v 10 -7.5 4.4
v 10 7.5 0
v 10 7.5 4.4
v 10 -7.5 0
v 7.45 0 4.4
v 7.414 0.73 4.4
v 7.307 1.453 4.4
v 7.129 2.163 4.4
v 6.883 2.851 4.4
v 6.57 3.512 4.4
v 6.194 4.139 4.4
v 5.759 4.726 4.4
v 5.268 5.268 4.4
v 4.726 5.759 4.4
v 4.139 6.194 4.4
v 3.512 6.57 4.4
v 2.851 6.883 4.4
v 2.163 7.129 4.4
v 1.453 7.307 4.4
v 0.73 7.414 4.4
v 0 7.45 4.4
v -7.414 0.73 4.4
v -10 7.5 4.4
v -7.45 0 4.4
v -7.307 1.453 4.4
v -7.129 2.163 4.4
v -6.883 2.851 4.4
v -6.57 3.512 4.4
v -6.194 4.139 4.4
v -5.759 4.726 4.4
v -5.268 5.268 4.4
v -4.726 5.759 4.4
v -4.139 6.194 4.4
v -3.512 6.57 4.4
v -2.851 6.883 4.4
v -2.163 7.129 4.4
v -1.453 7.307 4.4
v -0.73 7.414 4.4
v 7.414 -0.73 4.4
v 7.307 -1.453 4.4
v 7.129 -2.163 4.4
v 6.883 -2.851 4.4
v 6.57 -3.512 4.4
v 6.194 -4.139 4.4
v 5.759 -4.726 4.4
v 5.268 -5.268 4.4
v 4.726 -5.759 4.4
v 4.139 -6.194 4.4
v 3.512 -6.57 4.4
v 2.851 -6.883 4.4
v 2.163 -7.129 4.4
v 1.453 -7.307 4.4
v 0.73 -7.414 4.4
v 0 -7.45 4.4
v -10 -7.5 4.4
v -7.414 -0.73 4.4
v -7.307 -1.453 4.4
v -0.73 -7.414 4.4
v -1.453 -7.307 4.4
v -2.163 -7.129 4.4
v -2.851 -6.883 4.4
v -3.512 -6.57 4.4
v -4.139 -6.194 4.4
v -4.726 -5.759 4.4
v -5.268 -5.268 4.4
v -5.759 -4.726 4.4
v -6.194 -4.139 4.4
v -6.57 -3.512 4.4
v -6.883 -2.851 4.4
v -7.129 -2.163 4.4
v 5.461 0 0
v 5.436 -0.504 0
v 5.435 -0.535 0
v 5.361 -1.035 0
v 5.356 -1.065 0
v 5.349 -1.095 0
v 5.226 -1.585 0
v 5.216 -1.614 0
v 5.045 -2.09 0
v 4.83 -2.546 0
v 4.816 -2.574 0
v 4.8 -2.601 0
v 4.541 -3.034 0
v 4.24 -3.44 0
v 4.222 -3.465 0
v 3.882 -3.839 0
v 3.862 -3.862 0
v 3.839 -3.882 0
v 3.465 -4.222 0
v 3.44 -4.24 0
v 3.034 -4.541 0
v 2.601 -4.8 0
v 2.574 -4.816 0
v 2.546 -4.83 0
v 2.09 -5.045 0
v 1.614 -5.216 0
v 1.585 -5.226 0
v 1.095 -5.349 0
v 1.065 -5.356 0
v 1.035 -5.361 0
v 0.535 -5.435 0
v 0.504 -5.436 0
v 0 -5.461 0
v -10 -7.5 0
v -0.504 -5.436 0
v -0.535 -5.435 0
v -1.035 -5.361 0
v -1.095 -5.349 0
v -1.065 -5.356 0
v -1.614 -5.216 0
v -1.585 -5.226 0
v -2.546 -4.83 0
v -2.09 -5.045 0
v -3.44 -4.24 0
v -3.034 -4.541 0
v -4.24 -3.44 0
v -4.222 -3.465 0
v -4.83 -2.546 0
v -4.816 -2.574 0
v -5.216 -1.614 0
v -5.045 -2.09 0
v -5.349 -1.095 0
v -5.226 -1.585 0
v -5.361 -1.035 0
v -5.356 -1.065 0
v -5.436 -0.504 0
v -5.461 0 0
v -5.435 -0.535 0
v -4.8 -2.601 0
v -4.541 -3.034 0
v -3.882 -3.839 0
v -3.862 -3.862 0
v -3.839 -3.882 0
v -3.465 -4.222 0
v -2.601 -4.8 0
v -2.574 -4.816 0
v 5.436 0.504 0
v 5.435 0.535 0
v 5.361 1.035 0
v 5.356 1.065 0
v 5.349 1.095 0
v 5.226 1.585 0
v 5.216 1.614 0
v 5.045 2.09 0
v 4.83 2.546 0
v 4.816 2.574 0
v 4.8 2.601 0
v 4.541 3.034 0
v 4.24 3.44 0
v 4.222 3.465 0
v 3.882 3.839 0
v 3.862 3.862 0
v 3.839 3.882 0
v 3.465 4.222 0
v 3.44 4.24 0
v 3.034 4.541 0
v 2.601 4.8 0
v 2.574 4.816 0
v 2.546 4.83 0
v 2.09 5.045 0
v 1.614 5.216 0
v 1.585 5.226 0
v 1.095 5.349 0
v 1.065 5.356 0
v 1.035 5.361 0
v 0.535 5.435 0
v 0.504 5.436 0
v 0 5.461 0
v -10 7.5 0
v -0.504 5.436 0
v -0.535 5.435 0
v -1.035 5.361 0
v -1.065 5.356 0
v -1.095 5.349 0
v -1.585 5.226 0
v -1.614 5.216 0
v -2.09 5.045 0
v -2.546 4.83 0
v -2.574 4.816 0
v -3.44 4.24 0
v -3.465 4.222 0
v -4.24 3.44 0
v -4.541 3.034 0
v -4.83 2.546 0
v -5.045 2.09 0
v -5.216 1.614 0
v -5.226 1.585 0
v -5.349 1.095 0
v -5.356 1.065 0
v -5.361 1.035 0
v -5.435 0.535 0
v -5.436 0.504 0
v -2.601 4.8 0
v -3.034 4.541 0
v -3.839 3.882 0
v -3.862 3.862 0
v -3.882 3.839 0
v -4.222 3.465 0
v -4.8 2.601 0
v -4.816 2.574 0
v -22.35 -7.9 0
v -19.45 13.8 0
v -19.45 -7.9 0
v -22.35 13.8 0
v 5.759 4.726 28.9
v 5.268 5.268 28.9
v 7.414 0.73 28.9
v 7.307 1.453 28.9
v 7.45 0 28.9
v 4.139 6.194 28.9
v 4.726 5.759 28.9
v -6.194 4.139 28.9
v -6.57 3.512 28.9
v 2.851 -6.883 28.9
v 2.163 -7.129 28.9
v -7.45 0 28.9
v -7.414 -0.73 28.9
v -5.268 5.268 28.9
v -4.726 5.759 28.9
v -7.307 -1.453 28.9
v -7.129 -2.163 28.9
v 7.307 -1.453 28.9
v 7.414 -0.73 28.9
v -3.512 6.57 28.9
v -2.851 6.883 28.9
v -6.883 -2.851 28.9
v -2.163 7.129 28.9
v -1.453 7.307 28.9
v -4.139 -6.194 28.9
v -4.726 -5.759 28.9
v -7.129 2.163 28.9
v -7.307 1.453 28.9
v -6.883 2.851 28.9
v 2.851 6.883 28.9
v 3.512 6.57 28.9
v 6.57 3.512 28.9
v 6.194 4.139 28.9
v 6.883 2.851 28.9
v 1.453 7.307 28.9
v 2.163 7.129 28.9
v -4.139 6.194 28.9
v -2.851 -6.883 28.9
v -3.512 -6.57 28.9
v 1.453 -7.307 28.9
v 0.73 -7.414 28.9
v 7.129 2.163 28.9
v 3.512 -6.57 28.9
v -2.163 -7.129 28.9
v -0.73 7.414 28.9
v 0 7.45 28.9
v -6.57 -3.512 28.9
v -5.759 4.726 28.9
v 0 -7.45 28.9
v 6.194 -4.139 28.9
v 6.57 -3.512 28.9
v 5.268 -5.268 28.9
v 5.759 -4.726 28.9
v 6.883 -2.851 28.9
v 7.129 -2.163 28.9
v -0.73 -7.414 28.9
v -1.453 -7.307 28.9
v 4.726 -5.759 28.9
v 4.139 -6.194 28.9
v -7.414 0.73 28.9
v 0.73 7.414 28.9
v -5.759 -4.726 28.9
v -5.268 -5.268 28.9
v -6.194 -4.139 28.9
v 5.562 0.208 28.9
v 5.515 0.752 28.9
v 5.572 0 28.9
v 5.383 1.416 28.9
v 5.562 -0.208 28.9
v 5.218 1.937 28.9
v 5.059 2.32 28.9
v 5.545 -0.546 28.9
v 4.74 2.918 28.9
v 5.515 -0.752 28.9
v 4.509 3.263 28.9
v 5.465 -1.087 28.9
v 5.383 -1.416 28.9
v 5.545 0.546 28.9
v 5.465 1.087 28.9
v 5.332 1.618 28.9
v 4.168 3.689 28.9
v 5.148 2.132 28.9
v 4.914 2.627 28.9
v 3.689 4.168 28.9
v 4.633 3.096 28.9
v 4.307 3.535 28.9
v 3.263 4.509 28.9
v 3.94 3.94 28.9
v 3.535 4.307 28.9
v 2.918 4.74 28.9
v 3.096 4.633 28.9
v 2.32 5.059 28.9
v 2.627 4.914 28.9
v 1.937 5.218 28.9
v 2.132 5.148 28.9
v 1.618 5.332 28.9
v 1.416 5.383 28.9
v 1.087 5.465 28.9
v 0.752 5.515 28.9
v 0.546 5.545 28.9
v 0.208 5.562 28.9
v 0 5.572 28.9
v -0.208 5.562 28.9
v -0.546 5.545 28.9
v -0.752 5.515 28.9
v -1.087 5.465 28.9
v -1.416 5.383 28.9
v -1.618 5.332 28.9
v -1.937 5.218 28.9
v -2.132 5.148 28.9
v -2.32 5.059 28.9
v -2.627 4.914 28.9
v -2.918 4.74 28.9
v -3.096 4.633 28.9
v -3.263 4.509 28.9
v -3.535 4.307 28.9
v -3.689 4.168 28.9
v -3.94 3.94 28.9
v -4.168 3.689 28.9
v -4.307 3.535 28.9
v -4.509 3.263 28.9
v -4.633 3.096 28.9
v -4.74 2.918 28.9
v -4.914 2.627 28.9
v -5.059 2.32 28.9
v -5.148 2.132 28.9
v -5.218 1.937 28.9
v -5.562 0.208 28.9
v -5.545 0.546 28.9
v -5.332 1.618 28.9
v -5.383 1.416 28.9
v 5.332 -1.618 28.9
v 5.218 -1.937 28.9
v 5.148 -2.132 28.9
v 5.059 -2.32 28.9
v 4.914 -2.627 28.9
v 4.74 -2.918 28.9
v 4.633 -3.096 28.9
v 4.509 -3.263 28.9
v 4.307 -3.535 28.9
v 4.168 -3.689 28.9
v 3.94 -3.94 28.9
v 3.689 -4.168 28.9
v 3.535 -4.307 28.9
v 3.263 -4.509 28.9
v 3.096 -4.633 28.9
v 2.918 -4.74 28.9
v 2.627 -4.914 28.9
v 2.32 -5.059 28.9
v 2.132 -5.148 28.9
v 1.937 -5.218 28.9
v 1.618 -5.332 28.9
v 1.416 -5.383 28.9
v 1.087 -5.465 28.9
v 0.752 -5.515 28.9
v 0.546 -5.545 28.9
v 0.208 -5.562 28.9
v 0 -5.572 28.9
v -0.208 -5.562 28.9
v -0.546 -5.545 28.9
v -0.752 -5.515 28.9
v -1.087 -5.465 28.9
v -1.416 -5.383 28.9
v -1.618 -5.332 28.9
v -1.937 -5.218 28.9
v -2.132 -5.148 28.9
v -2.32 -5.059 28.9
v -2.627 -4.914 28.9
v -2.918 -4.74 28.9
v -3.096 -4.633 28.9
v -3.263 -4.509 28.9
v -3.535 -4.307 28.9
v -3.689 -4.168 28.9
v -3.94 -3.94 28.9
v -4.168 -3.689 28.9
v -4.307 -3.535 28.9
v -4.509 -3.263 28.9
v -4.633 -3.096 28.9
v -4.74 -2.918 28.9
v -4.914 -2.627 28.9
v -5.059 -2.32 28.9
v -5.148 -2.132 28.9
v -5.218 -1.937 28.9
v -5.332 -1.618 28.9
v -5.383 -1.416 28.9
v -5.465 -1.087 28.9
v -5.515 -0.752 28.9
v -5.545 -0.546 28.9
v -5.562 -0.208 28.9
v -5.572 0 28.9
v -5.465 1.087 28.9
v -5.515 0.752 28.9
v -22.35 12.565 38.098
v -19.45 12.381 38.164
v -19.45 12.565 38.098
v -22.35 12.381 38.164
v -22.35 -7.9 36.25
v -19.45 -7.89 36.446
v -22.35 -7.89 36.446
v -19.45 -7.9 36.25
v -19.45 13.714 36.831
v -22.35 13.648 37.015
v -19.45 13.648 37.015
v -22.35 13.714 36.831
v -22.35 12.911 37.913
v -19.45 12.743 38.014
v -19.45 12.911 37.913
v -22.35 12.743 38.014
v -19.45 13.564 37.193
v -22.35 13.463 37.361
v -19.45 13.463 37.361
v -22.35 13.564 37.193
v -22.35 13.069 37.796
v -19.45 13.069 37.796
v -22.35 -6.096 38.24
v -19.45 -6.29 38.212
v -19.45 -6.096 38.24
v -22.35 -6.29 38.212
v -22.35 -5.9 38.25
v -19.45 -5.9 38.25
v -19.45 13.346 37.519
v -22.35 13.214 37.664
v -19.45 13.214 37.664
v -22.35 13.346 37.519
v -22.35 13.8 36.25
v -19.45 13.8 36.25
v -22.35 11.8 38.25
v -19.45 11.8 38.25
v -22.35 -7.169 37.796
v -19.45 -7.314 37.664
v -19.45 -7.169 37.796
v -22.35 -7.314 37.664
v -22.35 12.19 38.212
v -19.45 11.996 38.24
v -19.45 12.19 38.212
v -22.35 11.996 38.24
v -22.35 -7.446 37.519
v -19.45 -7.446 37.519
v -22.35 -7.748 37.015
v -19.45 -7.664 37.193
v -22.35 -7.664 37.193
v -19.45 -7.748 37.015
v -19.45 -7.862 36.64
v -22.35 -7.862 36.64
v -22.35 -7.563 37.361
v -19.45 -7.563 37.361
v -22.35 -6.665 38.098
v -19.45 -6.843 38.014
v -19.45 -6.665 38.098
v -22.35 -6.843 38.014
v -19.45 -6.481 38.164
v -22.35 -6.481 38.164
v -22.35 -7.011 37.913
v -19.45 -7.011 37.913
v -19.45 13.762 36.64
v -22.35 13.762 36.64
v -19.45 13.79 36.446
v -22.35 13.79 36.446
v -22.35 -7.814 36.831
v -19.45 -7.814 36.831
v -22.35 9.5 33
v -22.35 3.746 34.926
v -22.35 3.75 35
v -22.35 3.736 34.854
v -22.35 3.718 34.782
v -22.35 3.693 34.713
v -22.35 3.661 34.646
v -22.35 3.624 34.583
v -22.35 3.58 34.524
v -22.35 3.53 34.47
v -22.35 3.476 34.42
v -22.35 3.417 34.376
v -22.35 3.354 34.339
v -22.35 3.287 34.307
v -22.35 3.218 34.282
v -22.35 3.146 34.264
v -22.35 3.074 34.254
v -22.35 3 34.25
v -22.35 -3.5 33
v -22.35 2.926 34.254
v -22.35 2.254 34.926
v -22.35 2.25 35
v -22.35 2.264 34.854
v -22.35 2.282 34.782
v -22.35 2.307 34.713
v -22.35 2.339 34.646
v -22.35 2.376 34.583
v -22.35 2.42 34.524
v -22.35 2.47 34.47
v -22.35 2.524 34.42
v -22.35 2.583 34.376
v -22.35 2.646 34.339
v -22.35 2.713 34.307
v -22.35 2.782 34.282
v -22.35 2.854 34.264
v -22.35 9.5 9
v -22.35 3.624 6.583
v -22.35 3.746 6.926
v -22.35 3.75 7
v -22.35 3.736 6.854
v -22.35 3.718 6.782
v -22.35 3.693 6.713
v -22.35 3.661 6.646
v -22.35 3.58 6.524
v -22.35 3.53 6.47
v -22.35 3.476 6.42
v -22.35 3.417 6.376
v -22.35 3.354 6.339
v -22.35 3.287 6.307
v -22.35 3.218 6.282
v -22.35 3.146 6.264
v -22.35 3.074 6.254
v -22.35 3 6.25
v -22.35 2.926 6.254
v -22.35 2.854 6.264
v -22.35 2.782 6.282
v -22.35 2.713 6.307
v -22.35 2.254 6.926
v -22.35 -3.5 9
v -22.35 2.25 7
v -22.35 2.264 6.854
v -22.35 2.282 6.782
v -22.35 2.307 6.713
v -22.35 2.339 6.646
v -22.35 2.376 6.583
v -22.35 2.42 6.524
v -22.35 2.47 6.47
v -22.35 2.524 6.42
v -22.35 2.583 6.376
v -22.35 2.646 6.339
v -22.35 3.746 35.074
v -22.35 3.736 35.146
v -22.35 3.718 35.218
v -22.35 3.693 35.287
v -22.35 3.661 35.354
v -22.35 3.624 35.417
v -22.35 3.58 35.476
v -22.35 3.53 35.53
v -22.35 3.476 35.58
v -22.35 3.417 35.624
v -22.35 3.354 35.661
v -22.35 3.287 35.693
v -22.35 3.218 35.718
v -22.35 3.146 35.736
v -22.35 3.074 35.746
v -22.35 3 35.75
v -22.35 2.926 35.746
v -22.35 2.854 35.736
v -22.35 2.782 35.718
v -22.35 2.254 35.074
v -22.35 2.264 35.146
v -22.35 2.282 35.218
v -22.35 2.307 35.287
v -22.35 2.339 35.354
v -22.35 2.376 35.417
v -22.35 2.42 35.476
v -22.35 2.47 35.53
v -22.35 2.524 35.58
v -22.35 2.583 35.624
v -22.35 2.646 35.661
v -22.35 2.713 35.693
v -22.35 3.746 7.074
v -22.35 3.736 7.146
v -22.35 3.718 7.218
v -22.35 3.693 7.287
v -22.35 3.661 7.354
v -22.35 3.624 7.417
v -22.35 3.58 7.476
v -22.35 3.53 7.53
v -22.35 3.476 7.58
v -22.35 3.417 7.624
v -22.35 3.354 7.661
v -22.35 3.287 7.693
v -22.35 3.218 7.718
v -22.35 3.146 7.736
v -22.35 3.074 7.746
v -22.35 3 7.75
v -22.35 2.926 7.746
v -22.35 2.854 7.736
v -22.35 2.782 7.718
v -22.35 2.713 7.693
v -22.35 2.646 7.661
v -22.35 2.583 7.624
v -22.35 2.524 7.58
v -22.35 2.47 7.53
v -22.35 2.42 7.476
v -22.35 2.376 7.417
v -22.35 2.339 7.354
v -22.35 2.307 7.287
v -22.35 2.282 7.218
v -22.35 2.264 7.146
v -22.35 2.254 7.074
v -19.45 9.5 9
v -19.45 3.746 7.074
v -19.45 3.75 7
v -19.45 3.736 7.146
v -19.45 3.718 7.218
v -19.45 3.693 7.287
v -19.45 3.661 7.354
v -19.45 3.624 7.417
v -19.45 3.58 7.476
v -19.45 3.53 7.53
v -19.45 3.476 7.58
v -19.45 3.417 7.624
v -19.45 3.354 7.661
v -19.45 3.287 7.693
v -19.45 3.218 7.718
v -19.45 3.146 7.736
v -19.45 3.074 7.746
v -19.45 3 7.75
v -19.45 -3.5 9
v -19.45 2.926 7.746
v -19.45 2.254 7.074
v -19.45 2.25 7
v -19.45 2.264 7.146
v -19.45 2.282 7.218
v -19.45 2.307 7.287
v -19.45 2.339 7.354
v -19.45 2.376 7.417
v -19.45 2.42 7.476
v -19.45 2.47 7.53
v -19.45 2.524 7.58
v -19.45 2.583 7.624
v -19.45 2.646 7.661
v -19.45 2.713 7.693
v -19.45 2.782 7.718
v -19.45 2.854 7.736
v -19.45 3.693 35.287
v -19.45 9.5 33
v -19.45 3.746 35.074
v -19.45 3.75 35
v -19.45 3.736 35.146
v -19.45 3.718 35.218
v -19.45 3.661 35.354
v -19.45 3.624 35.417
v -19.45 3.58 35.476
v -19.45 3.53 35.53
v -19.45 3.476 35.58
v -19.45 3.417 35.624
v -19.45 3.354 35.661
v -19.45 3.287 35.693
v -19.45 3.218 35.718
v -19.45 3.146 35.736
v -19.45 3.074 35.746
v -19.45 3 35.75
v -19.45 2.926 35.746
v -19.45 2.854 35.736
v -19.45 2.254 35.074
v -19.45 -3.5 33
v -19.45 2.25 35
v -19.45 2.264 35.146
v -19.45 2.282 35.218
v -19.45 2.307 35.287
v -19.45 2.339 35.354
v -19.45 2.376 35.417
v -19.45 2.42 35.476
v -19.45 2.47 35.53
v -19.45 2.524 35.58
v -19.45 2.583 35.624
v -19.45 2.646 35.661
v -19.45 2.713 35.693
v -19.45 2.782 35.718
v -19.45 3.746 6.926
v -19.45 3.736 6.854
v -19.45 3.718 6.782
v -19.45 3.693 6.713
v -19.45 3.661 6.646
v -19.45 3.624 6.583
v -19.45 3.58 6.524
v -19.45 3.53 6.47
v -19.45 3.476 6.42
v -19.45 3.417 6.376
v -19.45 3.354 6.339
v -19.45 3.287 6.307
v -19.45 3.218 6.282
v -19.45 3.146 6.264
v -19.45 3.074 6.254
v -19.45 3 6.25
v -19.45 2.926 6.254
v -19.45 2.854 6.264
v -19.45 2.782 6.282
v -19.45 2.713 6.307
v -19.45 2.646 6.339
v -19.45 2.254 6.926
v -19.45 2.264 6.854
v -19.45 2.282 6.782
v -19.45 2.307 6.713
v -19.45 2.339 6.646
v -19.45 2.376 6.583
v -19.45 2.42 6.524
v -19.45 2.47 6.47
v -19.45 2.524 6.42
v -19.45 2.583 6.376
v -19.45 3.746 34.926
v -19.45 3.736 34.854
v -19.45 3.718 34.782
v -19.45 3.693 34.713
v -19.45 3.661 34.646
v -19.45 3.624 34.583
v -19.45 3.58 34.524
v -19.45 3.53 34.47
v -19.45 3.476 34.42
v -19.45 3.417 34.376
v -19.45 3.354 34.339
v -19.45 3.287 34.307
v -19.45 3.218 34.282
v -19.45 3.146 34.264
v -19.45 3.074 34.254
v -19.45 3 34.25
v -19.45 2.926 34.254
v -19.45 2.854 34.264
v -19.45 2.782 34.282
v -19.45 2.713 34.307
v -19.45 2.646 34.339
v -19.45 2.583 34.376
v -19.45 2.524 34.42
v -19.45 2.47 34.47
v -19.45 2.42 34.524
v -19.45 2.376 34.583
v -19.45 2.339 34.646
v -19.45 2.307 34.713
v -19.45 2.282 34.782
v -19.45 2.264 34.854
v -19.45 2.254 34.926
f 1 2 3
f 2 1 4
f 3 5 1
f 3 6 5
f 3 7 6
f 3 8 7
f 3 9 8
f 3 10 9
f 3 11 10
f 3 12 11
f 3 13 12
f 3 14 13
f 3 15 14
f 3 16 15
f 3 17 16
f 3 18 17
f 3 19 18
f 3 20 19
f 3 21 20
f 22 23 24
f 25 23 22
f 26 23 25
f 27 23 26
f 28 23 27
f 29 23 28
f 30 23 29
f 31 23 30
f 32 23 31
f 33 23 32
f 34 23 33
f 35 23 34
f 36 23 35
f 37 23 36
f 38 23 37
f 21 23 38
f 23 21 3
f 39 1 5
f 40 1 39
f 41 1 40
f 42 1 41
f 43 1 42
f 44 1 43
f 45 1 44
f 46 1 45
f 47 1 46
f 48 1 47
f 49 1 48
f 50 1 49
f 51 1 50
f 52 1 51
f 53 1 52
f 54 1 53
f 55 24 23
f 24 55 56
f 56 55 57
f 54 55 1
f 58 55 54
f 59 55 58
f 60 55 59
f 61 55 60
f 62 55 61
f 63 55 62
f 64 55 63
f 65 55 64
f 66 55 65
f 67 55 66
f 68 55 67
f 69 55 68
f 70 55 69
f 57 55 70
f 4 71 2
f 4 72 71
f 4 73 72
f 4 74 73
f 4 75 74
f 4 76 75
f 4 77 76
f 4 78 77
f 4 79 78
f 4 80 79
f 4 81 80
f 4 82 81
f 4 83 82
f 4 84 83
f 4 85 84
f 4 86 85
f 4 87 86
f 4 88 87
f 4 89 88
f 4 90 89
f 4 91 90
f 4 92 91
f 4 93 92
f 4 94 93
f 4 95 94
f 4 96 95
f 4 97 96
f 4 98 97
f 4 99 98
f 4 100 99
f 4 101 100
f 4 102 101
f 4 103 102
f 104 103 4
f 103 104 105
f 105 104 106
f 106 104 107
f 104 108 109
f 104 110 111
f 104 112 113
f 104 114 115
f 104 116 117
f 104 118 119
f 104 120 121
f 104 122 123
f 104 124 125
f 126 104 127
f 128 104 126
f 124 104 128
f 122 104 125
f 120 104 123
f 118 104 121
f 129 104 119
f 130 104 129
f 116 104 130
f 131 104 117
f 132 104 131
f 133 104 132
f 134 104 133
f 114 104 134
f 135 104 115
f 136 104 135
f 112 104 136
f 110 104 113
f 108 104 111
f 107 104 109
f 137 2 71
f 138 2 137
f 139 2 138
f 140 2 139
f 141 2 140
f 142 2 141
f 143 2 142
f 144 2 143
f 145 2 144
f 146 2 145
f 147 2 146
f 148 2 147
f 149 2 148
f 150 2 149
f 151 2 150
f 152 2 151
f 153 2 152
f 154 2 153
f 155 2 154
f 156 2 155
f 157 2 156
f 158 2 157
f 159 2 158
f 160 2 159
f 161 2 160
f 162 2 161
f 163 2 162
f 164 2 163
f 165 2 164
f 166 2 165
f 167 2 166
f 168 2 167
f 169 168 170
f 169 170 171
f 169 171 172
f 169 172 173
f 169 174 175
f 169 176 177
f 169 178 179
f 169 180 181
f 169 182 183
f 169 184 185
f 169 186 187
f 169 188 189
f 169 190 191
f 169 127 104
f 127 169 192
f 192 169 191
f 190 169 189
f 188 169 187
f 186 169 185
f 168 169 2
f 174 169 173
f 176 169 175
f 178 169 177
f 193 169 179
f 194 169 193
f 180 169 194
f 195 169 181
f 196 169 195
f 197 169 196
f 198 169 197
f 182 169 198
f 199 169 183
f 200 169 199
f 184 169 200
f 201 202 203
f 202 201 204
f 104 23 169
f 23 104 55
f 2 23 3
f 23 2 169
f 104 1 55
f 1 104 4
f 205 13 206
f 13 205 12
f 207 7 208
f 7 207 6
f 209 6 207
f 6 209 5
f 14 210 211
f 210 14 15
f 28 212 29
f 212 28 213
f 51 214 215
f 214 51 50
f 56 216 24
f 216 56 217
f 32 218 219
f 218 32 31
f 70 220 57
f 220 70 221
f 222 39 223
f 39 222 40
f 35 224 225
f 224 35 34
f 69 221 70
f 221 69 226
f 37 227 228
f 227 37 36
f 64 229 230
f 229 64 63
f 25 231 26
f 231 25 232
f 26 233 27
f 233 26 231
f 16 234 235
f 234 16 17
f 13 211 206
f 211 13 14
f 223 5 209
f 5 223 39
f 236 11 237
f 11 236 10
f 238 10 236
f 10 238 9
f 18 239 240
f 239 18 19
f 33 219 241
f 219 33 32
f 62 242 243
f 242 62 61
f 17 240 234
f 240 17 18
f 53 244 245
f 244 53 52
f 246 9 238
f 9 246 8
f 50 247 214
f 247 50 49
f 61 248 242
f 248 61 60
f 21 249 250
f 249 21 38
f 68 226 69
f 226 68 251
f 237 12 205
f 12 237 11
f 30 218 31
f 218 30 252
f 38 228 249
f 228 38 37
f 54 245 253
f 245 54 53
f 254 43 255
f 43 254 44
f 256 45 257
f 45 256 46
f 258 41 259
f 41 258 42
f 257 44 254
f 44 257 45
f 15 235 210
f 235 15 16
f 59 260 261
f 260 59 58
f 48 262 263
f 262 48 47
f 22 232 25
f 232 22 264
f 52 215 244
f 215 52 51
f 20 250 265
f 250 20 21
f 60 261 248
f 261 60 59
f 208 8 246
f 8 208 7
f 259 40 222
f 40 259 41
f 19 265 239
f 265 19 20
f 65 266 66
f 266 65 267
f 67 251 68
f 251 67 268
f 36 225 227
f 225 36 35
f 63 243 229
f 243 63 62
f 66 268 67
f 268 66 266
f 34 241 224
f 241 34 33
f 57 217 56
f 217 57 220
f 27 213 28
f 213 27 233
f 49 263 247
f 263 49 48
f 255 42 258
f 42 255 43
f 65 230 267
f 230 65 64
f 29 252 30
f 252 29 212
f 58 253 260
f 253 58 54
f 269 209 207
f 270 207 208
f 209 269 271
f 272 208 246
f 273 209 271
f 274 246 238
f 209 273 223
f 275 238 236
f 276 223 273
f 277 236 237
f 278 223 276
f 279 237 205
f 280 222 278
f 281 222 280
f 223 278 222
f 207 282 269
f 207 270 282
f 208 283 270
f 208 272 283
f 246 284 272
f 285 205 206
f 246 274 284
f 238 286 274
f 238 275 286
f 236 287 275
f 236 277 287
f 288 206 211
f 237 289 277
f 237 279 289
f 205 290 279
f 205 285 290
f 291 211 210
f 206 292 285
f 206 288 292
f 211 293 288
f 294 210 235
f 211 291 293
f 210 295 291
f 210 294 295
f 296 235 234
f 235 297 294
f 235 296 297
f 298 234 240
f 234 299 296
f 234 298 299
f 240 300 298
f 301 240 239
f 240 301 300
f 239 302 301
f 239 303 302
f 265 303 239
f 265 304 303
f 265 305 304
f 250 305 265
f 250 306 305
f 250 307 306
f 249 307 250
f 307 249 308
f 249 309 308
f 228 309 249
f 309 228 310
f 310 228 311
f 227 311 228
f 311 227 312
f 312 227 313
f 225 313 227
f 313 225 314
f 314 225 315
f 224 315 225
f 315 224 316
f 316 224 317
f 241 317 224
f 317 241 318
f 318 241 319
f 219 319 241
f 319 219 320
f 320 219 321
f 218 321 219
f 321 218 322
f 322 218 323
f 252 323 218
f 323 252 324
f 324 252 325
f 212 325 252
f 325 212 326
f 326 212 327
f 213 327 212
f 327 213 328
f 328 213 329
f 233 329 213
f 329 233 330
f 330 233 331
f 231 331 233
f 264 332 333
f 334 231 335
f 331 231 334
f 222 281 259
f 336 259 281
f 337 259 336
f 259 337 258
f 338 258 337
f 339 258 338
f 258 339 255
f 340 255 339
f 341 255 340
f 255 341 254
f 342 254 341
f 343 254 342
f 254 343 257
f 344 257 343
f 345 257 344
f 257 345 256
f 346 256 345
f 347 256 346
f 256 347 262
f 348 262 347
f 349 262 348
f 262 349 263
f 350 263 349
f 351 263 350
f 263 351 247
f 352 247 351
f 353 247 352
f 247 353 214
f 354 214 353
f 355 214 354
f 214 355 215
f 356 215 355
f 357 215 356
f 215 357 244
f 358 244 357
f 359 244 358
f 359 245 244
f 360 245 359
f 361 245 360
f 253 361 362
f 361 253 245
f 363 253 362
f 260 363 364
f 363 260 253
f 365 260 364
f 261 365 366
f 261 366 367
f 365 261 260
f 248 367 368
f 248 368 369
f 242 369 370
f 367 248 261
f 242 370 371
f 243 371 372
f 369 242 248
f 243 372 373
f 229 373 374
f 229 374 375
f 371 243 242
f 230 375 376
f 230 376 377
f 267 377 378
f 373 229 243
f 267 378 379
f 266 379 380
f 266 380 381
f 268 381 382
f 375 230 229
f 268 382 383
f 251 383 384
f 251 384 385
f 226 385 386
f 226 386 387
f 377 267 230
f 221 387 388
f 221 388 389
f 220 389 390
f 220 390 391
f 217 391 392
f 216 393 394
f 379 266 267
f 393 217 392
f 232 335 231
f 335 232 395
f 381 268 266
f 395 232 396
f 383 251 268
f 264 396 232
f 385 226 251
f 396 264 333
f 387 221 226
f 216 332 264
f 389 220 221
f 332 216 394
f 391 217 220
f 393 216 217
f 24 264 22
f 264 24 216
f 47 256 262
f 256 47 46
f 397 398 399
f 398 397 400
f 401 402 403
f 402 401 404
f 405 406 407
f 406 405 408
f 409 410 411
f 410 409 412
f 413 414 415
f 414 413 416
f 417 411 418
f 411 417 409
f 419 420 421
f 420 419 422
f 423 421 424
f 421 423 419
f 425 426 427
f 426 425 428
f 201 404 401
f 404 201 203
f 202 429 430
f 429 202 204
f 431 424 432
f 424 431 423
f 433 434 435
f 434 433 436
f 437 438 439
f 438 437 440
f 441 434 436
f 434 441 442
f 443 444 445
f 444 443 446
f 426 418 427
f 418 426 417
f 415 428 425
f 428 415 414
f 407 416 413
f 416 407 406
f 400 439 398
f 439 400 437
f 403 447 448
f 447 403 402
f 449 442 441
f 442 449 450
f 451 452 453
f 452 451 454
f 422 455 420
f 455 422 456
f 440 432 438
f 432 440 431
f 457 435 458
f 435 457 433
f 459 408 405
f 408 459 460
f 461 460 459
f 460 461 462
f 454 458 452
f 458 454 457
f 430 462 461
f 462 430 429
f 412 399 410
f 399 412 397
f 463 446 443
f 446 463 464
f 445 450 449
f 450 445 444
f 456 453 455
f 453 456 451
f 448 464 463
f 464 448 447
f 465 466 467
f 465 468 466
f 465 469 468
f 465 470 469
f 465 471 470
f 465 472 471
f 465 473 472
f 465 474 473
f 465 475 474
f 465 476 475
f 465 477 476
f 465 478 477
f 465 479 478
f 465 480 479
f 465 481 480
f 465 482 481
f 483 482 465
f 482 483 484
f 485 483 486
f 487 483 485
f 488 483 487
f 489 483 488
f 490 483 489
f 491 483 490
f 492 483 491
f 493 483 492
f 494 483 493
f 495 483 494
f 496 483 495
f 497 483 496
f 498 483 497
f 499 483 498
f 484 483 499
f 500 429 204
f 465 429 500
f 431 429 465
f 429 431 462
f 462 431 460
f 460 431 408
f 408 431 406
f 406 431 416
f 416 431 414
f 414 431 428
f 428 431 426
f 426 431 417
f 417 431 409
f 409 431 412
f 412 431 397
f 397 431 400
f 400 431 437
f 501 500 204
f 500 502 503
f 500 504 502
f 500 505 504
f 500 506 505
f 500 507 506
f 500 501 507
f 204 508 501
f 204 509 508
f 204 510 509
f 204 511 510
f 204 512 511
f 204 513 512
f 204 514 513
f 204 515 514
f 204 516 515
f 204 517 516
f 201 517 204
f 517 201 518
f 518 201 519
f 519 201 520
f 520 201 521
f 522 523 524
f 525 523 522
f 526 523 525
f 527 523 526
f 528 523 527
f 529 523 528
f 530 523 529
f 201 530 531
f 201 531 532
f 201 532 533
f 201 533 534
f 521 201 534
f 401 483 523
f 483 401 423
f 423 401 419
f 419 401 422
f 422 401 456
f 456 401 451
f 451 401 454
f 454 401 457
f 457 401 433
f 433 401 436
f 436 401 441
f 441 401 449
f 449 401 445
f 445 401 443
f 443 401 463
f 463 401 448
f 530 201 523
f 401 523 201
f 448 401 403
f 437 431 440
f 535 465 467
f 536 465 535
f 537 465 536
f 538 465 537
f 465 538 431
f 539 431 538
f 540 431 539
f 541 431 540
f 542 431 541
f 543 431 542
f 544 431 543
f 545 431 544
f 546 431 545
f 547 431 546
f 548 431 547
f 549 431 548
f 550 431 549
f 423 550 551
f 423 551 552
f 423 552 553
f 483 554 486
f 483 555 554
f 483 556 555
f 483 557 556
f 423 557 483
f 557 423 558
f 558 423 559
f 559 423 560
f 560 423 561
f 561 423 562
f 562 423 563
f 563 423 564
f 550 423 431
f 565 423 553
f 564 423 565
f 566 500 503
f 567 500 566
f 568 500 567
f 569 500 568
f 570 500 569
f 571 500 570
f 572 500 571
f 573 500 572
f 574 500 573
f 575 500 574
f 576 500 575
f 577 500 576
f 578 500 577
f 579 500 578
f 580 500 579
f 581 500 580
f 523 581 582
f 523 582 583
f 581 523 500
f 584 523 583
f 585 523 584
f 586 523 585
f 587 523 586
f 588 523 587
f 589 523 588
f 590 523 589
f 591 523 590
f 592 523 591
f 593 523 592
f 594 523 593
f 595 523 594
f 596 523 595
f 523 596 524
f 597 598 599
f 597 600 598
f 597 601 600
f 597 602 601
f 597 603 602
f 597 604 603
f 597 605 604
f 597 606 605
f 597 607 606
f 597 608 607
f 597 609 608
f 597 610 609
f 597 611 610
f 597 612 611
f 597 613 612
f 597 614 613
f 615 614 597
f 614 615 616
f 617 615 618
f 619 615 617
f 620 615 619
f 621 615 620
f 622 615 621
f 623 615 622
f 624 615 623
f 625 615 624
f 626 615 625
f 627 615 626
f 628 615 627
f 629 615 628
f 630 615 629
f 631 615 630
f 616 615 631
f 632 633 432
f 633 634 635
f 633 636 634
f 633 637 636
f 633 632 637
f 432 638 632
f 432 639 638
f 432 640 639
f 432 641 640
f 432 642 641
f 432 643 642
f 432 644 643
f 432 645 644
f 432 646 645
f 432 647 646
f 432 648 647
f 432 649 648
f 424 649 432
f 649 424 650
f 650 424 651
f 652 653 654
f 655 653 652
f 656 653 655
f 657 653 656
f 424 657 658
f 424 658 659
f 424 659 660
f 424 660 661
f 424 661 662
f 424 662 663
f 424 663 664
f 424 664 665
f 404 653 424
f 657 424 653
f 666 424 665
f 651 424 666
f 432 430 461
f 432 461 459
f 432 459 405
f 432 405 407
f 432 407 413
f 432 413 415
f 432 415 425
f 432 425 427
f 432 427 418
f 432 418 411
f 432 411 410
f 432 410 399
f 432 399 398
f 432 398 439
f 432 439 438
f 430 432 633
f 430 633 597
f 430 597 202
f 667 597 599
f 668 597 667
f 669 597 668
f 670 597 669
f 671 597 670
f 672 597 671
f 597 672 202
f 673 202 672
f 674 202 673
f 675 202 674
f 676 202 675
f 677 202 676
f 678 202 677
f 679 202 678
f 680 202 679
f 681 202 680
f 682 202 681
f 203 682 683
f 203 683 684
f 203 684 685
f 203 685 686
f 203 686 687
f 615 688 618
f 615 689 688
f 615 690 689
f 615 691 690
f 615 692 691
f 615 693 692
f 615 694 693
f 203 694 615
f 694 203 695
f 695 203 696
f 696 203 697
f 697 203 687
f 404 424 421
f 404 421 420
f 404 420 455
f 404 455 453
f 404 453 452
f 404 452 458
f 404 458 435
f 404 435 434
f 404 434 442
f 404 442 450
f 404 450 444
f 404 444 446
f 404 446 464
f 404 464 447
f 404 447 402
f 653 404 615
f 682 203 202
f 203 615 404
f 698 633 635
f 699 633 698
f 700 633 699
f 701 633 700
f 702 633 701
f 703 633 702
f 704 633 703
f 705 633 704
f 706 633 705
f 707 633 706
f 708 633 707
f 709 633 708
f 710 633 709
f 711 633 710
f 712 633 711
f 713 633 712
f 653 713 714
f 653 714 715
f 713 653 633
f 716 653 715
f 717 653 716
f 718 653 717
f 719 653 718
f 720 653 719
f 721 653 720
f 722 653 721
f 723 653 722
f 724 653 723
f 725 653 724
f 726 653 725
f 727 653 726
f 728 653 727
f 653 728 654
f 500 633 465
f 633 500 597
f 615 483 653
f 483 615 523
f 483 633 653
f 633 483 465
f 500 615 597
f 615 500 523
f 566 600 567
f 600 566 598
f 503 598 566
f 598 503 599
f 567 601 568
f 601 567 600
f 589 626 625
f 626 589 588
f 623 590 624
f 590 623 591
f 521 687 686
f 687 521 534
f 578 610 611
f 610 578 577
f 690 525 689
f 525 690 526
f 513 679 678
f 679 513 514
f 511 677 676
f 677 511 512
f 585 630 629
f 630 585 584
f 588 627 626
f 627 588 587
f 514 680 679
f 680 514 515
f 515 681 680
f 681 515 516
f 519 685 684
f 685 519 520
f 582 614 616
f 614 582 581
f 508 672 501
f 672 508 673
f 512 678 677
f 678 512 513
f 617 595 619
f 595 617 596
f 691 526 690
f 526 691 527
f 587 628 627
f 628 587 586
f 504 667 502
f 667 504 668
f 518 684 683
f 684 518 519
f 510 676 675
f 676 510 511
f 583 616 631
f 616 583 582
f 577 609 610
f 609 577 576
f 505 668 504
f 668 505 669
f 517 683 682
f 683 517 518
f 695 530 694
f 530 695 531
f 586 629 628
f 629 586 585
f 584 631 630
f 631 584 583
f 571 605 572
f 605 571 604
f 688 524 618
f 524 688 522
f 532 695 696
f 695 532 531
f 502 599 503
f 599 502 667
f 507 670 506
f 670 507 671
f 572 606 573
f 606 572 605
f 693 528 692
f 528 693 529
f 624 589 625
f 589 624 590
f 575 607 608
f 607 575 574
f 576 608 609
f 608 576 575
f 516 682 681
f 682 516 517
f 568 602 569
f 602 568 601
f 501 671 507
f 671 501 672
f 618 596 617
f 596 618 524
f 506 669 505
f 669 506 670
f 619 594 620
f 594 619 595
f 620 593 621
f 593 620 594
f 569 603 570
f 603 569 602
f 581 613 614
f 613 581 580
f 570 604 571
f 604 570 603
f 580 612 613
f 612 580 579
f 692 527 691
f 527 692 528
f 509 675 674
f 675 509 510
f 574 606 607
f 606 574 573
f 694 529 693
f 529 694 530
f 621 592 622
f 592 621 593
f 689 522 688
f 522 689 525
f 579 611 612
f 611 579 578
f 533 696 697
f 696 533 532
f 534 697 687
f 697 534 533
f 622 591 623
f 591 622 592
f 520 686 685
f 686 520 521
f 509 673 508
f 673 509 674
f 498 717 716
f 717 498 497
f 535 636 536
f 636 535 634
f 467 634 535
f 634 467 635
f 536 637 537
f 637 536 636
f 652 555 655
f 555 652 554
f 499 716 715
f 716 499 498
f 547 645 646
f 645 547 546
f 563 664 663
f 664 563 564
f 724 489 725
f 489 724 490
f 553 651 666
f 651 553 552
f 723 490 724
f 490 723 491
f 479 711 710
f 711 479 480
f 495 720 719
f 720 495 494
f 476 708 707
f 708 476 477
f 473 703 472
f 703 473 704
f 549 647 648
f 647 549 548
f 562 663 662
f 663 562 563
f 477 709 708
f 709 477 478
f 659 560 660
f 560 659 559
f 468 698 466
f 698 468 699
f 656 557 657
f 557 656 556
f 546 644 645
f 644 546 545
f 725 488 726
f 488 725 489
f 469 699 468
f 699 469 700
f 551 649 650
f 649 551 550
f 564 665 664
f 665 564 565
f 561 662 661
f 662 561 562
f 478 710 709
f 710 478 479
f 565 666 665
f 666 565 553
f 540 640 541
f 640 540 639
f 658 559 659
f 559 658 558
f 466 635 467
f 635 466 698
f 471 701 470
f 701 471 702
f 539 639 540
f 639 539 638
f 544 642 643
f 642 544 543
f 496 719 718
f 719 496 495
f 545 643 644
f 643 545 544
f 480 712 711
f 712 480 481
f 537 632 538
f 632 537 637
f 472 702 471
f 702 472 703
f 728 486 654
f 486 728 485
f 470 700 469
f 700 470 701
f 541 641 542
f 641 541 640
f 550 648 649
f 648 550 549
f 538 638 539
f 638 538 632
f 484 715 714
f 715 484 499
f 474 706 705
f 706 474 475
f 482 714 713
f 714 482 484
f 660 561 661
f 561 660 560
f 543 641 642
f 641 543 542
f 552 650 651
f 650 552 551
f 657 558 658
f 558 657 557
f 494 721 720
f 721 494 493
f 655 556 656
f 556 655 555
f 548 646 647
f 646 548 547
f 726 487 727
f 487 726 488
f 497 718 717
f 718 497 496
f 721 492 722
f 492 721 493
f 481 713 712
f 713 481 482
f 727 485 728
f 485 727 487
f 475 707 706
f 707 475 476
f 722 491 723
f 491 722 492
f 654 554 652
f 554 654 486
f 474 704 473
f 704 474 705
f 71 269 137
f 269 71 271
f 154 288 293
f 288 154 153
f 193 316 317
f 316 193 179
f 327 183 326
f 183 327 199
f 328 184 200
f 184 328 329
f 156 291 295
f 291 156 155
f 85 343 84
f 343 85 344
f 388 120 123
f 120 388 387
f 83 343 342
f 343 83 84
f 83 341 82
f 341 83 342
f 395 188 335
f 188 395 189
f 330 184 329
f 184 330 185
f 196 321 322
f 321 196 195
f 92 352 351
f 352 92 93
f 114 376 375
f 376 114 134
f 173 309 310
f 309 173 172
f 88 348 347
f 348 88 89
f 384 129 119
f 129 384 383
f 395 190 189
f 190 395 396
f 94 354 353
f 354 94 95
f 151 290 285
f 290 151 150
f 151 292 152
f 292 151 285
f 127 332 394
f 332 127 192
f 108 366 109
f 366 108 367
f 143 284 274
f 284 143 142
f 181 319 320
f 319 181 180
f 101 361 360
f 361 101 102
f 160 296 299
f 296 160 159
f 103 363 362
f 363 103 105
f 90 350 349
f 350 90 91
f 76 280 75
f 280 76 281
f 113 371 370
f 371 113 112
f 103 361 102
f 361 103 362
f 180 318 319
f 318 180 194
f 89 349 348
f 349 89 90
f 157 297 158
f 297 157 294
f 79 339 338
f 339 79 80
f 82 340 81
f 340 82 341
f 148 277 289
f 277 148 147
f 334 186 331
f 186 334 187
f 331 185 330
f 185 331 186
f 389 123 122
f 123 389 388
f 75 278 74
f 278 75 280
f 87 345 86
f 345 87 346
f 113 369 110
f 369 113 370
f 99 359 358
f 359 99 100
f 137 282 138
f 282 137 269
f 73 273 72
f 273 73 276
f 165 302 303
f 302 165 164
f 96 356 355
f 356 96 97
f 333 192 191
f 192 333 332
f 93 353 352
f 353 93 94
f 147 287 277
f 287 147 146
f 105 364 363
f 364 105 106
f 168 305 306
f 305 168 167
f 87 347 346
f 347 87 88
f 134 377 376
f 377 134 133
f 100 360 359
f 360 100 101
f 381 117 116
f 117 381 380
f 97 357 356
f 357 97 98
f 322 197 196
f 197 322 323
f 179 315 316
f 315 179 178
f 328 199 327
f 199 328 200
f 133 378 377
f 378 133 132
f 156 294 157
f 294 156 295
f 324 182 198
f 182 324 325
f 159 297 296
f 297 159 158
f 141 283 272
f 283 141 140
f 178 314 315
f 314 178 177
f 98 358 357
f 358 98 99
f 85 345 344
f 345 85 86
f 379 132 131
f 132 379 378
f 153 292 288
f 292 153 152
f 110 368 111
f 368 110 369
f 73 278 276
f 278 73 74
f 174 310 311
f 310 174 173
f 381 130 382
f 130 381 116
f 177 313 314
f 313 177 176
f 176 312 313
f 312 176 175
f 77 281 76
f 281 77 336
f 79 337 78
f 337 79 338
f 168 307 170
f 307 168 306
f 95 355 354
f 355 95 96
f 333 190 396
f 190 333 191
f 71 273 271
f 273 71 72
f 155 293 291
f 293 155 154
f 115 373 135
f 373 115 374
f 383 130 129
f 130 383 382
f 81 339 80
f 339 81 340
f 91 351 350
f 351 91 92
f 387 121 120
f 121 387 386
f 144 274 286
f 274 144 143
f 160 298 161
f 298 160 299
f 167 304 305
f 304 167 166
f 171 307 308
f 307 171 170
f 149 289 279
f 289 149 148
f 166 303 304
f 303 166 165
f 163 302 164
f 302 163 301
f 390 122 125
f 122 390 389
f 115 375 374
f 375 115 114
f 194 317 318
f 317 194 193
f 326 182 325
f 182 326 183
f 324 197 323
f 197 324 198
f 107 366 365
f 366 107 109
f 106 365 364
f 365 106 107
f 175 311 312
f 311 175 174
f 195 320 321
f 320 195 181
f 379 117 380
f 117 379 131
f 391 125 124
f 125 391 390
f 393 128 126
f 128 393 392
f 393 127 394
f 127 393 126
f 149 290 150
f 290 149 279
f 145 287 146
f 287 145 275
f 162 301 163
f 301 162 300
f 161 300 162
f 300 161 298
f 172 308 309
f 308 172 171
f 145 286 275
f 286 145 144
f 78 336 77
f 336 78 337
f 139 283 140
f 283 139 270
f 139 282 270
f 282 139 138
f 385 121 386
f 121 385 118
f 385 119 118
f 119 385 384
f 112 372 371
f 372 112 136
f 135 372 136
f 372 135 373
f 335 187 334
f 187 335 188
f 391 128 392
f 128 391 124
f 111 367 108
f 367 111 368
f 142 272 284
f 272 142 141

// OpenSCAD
// pen holder for plotting robot




// Diameter of pen in mm.
penDiameter = 10.9;  // 10.60

union();

$fn = 64;

barrelDiameter = 15; // don't change or M3 holes shift

penRadius = penDiameter / 2;
barrelHieght = 24 + 2;
barrelWallThickness = 2;
baseThickness = 2.9;
cornerRounding = 2;
M3holeDia = 3.5;
M3nutDia = 6.6;
holeOffset = M3holeDia * 1.2;
baseLen = 15;
//baseWid = penDiameter + 2 * barrelWallThickness + 2;
baseWid = 20;
echo(baseWid);
echo(baseLen);


// servo bracket variables
servoOveralHeight = 34.5;  // 34.5 
servoBodyHeight = 24;
servoBodyWidth = 13;
servoScrewDia = 1.5;
servoScrewOffset = 2;
servoHeightOffset = barrelHieght - 5;
servoFwdOffset = penRadius + barrelWallThickness + baseThickness + 12;



difference(){
	union(){
		penHolder();
		servoBracket();
	}
    // re-drill the hole covered by servoBracket
	translate([0, 0, -baseThickness])
	cylinder(2 * barrelHieght, penRadius, penRadius+0.2);

    translate([-40, -40, -40])
    cube([80, 80, 40]);

    rotate([0, 0, 0])
    union(){
		
		// pen hole
		//
    }
}	


module roundedCube(xdim ,ydim ,zdim, rdim){
	hull(){ // https://youtu.be/gKOkJWiTgAY
		translate([rdim, rdim, 0]) cylinder(zdim, rdim, rdim);
		translate([xdim-rdim, rdim, 0]) cylinder(zdim, rdim, rdim);
		translate([rdim, ydim-rdim, 0]) cylinder(zdim, rdim, rdim);
		translate([xdim-rdim, ydim-rdim, 0]) cylinder(zdim, rdim, rdim);
	}
}


module halfRoundedCube(xdim ,ydim ,zdim, rdim){
	hull(){ // only round two sides
		translate([0, rdim, 0]) cube([2, rdim * 2, zdim]);
		translate([xdim-rdim, rdim, 0]) cube([rdim, rdim * 2, zdim]);
		translate([rdim, ydim-rdim, 0]) cylinder(zdim, rdim, rdim);
		translate([xdim-rdim, ydim-rdim, 0]) cylinder(zdim, rdim, rdim);
	}
}


module halfRoundedCube2(xdim ,ydim ,zdim, rdim){
	hull(){ // https://youtu.be/gKOkJWiTgAY
		translate([rdim, rdim, 0]) cylinder(zdim, rdim, rdim);
		translate([xdim-rdim, 0, 0]) cube([rdim, rdim * 2, zdim ]);
		translate([rdim, ydim-rdim, 0]) cylinder(zdim, rdim, rdim);
		translate([xdim-rdim, ydim-rdim, 0]) cube([zdim, rdim, rdim]);
	}
}


module halfRoundedCube3(xdim ,ydim ,zdim, rdim){
	hull(){ // https://youtu.be/gKOkJWiTgAY
		translate([rdim, rdim, 0]) cylinder(zdim, rdim, rdim);
		translate([xdim-rdim, rdim, 0]) cylinder(zdim, rdim, rdim);
		translate([0, ydim-rdim, 0]) cube([zdim, rdim, rdim]);
		translate([xdim-rdim, ydim-rdim, 0]) cube([zdim, rdim, rdim + 1]);
	}
}



module penHolder(){
	// base plate
    rotate([0, 0, 0])
	difference(){
		translate([	-baseWid / 2, -baseLen / 2, 0])

		// base piece
		//roundedCube(baseWid, baseLen, baseThickness, cornerRounding);
        cube([baseWid, baseLen, baseThickness + 1.5]);

		// pen hole
		//cylinder(baseThickness, penRadius, penRadius);
    };


	// pen barrel
	translate([0, 0, baseThickness])
	difference(){
		// barrel
		cylinder(	barrelHieght, 
					penRadius + barrelWallThickness, 
					penRadius + barrelWallThickness );
		// bore
		//cylinder(barrelHieght, penRadius, penRadius + 0.25);	
	}
}


module servoBracket(){
	// servo bracket face
	//rotate([0, 90, 90]) // (z, z, x) now
	//translate([	-servoHeightOffset, 0, servoFwdOffset])
    translate([-servoFwdOffset, 3, servoHeightOffset])
    rotate([90, 0, 90])

 
	difference(){
		// base 

		union(){

            
			translate([-(   servoBodyWidth + 2 * baseThickness) / 2 -1.5,
						 	-servoOveralHeight / 2 - 6, 0])
			halfRoundedCube(servoBodyWidth + 3 * baseThickness,
							servoOveralHeight + 6, 
                            baseThickness, cornerRounding);         
		}
        
        // cut off underneath
        //translate([-50, -50, -100])
        //cube([100, 100, 100]);
        
        // base holes
		translate([ -(servoBodyWidth + 2 * baseThickness) / 2 + M3holeDia,
					-servoOveralHeight / 2 + 1, 10 / 1.5])
		rotate([90, 0, 0])
		cylinder(baseThickness + 2, d=M3holeDia, d=M3holeDia);

		// body cutout
		translate([-servoBodyWidth / 2, -servoBodyHeight / 2, 0])
		cube([servoBodyWidth, servoBodyHeight , baseThickness + 1]);

		//translate([-servoBodyWidth / 2, 0.6, 0])
		//cube([servoBodyWidth, servoBodyHeight / 2 - 0.6, baseThickness + 1]);

		// vertical screw holes
		translate([0, -servoBodyHeight / 2 - servoScrewOffset, 0])
		cylinder(baseThickness + 1, servoScrewDia / 2, servoScrewDia / 2);
		translate([0, servoBodyHeight / 2 + servoScrewOffset, 0])
		cylinder(baseThickness + 1, servoScrewDia / 2, servoScrewDia / 2);
        

	}


}
